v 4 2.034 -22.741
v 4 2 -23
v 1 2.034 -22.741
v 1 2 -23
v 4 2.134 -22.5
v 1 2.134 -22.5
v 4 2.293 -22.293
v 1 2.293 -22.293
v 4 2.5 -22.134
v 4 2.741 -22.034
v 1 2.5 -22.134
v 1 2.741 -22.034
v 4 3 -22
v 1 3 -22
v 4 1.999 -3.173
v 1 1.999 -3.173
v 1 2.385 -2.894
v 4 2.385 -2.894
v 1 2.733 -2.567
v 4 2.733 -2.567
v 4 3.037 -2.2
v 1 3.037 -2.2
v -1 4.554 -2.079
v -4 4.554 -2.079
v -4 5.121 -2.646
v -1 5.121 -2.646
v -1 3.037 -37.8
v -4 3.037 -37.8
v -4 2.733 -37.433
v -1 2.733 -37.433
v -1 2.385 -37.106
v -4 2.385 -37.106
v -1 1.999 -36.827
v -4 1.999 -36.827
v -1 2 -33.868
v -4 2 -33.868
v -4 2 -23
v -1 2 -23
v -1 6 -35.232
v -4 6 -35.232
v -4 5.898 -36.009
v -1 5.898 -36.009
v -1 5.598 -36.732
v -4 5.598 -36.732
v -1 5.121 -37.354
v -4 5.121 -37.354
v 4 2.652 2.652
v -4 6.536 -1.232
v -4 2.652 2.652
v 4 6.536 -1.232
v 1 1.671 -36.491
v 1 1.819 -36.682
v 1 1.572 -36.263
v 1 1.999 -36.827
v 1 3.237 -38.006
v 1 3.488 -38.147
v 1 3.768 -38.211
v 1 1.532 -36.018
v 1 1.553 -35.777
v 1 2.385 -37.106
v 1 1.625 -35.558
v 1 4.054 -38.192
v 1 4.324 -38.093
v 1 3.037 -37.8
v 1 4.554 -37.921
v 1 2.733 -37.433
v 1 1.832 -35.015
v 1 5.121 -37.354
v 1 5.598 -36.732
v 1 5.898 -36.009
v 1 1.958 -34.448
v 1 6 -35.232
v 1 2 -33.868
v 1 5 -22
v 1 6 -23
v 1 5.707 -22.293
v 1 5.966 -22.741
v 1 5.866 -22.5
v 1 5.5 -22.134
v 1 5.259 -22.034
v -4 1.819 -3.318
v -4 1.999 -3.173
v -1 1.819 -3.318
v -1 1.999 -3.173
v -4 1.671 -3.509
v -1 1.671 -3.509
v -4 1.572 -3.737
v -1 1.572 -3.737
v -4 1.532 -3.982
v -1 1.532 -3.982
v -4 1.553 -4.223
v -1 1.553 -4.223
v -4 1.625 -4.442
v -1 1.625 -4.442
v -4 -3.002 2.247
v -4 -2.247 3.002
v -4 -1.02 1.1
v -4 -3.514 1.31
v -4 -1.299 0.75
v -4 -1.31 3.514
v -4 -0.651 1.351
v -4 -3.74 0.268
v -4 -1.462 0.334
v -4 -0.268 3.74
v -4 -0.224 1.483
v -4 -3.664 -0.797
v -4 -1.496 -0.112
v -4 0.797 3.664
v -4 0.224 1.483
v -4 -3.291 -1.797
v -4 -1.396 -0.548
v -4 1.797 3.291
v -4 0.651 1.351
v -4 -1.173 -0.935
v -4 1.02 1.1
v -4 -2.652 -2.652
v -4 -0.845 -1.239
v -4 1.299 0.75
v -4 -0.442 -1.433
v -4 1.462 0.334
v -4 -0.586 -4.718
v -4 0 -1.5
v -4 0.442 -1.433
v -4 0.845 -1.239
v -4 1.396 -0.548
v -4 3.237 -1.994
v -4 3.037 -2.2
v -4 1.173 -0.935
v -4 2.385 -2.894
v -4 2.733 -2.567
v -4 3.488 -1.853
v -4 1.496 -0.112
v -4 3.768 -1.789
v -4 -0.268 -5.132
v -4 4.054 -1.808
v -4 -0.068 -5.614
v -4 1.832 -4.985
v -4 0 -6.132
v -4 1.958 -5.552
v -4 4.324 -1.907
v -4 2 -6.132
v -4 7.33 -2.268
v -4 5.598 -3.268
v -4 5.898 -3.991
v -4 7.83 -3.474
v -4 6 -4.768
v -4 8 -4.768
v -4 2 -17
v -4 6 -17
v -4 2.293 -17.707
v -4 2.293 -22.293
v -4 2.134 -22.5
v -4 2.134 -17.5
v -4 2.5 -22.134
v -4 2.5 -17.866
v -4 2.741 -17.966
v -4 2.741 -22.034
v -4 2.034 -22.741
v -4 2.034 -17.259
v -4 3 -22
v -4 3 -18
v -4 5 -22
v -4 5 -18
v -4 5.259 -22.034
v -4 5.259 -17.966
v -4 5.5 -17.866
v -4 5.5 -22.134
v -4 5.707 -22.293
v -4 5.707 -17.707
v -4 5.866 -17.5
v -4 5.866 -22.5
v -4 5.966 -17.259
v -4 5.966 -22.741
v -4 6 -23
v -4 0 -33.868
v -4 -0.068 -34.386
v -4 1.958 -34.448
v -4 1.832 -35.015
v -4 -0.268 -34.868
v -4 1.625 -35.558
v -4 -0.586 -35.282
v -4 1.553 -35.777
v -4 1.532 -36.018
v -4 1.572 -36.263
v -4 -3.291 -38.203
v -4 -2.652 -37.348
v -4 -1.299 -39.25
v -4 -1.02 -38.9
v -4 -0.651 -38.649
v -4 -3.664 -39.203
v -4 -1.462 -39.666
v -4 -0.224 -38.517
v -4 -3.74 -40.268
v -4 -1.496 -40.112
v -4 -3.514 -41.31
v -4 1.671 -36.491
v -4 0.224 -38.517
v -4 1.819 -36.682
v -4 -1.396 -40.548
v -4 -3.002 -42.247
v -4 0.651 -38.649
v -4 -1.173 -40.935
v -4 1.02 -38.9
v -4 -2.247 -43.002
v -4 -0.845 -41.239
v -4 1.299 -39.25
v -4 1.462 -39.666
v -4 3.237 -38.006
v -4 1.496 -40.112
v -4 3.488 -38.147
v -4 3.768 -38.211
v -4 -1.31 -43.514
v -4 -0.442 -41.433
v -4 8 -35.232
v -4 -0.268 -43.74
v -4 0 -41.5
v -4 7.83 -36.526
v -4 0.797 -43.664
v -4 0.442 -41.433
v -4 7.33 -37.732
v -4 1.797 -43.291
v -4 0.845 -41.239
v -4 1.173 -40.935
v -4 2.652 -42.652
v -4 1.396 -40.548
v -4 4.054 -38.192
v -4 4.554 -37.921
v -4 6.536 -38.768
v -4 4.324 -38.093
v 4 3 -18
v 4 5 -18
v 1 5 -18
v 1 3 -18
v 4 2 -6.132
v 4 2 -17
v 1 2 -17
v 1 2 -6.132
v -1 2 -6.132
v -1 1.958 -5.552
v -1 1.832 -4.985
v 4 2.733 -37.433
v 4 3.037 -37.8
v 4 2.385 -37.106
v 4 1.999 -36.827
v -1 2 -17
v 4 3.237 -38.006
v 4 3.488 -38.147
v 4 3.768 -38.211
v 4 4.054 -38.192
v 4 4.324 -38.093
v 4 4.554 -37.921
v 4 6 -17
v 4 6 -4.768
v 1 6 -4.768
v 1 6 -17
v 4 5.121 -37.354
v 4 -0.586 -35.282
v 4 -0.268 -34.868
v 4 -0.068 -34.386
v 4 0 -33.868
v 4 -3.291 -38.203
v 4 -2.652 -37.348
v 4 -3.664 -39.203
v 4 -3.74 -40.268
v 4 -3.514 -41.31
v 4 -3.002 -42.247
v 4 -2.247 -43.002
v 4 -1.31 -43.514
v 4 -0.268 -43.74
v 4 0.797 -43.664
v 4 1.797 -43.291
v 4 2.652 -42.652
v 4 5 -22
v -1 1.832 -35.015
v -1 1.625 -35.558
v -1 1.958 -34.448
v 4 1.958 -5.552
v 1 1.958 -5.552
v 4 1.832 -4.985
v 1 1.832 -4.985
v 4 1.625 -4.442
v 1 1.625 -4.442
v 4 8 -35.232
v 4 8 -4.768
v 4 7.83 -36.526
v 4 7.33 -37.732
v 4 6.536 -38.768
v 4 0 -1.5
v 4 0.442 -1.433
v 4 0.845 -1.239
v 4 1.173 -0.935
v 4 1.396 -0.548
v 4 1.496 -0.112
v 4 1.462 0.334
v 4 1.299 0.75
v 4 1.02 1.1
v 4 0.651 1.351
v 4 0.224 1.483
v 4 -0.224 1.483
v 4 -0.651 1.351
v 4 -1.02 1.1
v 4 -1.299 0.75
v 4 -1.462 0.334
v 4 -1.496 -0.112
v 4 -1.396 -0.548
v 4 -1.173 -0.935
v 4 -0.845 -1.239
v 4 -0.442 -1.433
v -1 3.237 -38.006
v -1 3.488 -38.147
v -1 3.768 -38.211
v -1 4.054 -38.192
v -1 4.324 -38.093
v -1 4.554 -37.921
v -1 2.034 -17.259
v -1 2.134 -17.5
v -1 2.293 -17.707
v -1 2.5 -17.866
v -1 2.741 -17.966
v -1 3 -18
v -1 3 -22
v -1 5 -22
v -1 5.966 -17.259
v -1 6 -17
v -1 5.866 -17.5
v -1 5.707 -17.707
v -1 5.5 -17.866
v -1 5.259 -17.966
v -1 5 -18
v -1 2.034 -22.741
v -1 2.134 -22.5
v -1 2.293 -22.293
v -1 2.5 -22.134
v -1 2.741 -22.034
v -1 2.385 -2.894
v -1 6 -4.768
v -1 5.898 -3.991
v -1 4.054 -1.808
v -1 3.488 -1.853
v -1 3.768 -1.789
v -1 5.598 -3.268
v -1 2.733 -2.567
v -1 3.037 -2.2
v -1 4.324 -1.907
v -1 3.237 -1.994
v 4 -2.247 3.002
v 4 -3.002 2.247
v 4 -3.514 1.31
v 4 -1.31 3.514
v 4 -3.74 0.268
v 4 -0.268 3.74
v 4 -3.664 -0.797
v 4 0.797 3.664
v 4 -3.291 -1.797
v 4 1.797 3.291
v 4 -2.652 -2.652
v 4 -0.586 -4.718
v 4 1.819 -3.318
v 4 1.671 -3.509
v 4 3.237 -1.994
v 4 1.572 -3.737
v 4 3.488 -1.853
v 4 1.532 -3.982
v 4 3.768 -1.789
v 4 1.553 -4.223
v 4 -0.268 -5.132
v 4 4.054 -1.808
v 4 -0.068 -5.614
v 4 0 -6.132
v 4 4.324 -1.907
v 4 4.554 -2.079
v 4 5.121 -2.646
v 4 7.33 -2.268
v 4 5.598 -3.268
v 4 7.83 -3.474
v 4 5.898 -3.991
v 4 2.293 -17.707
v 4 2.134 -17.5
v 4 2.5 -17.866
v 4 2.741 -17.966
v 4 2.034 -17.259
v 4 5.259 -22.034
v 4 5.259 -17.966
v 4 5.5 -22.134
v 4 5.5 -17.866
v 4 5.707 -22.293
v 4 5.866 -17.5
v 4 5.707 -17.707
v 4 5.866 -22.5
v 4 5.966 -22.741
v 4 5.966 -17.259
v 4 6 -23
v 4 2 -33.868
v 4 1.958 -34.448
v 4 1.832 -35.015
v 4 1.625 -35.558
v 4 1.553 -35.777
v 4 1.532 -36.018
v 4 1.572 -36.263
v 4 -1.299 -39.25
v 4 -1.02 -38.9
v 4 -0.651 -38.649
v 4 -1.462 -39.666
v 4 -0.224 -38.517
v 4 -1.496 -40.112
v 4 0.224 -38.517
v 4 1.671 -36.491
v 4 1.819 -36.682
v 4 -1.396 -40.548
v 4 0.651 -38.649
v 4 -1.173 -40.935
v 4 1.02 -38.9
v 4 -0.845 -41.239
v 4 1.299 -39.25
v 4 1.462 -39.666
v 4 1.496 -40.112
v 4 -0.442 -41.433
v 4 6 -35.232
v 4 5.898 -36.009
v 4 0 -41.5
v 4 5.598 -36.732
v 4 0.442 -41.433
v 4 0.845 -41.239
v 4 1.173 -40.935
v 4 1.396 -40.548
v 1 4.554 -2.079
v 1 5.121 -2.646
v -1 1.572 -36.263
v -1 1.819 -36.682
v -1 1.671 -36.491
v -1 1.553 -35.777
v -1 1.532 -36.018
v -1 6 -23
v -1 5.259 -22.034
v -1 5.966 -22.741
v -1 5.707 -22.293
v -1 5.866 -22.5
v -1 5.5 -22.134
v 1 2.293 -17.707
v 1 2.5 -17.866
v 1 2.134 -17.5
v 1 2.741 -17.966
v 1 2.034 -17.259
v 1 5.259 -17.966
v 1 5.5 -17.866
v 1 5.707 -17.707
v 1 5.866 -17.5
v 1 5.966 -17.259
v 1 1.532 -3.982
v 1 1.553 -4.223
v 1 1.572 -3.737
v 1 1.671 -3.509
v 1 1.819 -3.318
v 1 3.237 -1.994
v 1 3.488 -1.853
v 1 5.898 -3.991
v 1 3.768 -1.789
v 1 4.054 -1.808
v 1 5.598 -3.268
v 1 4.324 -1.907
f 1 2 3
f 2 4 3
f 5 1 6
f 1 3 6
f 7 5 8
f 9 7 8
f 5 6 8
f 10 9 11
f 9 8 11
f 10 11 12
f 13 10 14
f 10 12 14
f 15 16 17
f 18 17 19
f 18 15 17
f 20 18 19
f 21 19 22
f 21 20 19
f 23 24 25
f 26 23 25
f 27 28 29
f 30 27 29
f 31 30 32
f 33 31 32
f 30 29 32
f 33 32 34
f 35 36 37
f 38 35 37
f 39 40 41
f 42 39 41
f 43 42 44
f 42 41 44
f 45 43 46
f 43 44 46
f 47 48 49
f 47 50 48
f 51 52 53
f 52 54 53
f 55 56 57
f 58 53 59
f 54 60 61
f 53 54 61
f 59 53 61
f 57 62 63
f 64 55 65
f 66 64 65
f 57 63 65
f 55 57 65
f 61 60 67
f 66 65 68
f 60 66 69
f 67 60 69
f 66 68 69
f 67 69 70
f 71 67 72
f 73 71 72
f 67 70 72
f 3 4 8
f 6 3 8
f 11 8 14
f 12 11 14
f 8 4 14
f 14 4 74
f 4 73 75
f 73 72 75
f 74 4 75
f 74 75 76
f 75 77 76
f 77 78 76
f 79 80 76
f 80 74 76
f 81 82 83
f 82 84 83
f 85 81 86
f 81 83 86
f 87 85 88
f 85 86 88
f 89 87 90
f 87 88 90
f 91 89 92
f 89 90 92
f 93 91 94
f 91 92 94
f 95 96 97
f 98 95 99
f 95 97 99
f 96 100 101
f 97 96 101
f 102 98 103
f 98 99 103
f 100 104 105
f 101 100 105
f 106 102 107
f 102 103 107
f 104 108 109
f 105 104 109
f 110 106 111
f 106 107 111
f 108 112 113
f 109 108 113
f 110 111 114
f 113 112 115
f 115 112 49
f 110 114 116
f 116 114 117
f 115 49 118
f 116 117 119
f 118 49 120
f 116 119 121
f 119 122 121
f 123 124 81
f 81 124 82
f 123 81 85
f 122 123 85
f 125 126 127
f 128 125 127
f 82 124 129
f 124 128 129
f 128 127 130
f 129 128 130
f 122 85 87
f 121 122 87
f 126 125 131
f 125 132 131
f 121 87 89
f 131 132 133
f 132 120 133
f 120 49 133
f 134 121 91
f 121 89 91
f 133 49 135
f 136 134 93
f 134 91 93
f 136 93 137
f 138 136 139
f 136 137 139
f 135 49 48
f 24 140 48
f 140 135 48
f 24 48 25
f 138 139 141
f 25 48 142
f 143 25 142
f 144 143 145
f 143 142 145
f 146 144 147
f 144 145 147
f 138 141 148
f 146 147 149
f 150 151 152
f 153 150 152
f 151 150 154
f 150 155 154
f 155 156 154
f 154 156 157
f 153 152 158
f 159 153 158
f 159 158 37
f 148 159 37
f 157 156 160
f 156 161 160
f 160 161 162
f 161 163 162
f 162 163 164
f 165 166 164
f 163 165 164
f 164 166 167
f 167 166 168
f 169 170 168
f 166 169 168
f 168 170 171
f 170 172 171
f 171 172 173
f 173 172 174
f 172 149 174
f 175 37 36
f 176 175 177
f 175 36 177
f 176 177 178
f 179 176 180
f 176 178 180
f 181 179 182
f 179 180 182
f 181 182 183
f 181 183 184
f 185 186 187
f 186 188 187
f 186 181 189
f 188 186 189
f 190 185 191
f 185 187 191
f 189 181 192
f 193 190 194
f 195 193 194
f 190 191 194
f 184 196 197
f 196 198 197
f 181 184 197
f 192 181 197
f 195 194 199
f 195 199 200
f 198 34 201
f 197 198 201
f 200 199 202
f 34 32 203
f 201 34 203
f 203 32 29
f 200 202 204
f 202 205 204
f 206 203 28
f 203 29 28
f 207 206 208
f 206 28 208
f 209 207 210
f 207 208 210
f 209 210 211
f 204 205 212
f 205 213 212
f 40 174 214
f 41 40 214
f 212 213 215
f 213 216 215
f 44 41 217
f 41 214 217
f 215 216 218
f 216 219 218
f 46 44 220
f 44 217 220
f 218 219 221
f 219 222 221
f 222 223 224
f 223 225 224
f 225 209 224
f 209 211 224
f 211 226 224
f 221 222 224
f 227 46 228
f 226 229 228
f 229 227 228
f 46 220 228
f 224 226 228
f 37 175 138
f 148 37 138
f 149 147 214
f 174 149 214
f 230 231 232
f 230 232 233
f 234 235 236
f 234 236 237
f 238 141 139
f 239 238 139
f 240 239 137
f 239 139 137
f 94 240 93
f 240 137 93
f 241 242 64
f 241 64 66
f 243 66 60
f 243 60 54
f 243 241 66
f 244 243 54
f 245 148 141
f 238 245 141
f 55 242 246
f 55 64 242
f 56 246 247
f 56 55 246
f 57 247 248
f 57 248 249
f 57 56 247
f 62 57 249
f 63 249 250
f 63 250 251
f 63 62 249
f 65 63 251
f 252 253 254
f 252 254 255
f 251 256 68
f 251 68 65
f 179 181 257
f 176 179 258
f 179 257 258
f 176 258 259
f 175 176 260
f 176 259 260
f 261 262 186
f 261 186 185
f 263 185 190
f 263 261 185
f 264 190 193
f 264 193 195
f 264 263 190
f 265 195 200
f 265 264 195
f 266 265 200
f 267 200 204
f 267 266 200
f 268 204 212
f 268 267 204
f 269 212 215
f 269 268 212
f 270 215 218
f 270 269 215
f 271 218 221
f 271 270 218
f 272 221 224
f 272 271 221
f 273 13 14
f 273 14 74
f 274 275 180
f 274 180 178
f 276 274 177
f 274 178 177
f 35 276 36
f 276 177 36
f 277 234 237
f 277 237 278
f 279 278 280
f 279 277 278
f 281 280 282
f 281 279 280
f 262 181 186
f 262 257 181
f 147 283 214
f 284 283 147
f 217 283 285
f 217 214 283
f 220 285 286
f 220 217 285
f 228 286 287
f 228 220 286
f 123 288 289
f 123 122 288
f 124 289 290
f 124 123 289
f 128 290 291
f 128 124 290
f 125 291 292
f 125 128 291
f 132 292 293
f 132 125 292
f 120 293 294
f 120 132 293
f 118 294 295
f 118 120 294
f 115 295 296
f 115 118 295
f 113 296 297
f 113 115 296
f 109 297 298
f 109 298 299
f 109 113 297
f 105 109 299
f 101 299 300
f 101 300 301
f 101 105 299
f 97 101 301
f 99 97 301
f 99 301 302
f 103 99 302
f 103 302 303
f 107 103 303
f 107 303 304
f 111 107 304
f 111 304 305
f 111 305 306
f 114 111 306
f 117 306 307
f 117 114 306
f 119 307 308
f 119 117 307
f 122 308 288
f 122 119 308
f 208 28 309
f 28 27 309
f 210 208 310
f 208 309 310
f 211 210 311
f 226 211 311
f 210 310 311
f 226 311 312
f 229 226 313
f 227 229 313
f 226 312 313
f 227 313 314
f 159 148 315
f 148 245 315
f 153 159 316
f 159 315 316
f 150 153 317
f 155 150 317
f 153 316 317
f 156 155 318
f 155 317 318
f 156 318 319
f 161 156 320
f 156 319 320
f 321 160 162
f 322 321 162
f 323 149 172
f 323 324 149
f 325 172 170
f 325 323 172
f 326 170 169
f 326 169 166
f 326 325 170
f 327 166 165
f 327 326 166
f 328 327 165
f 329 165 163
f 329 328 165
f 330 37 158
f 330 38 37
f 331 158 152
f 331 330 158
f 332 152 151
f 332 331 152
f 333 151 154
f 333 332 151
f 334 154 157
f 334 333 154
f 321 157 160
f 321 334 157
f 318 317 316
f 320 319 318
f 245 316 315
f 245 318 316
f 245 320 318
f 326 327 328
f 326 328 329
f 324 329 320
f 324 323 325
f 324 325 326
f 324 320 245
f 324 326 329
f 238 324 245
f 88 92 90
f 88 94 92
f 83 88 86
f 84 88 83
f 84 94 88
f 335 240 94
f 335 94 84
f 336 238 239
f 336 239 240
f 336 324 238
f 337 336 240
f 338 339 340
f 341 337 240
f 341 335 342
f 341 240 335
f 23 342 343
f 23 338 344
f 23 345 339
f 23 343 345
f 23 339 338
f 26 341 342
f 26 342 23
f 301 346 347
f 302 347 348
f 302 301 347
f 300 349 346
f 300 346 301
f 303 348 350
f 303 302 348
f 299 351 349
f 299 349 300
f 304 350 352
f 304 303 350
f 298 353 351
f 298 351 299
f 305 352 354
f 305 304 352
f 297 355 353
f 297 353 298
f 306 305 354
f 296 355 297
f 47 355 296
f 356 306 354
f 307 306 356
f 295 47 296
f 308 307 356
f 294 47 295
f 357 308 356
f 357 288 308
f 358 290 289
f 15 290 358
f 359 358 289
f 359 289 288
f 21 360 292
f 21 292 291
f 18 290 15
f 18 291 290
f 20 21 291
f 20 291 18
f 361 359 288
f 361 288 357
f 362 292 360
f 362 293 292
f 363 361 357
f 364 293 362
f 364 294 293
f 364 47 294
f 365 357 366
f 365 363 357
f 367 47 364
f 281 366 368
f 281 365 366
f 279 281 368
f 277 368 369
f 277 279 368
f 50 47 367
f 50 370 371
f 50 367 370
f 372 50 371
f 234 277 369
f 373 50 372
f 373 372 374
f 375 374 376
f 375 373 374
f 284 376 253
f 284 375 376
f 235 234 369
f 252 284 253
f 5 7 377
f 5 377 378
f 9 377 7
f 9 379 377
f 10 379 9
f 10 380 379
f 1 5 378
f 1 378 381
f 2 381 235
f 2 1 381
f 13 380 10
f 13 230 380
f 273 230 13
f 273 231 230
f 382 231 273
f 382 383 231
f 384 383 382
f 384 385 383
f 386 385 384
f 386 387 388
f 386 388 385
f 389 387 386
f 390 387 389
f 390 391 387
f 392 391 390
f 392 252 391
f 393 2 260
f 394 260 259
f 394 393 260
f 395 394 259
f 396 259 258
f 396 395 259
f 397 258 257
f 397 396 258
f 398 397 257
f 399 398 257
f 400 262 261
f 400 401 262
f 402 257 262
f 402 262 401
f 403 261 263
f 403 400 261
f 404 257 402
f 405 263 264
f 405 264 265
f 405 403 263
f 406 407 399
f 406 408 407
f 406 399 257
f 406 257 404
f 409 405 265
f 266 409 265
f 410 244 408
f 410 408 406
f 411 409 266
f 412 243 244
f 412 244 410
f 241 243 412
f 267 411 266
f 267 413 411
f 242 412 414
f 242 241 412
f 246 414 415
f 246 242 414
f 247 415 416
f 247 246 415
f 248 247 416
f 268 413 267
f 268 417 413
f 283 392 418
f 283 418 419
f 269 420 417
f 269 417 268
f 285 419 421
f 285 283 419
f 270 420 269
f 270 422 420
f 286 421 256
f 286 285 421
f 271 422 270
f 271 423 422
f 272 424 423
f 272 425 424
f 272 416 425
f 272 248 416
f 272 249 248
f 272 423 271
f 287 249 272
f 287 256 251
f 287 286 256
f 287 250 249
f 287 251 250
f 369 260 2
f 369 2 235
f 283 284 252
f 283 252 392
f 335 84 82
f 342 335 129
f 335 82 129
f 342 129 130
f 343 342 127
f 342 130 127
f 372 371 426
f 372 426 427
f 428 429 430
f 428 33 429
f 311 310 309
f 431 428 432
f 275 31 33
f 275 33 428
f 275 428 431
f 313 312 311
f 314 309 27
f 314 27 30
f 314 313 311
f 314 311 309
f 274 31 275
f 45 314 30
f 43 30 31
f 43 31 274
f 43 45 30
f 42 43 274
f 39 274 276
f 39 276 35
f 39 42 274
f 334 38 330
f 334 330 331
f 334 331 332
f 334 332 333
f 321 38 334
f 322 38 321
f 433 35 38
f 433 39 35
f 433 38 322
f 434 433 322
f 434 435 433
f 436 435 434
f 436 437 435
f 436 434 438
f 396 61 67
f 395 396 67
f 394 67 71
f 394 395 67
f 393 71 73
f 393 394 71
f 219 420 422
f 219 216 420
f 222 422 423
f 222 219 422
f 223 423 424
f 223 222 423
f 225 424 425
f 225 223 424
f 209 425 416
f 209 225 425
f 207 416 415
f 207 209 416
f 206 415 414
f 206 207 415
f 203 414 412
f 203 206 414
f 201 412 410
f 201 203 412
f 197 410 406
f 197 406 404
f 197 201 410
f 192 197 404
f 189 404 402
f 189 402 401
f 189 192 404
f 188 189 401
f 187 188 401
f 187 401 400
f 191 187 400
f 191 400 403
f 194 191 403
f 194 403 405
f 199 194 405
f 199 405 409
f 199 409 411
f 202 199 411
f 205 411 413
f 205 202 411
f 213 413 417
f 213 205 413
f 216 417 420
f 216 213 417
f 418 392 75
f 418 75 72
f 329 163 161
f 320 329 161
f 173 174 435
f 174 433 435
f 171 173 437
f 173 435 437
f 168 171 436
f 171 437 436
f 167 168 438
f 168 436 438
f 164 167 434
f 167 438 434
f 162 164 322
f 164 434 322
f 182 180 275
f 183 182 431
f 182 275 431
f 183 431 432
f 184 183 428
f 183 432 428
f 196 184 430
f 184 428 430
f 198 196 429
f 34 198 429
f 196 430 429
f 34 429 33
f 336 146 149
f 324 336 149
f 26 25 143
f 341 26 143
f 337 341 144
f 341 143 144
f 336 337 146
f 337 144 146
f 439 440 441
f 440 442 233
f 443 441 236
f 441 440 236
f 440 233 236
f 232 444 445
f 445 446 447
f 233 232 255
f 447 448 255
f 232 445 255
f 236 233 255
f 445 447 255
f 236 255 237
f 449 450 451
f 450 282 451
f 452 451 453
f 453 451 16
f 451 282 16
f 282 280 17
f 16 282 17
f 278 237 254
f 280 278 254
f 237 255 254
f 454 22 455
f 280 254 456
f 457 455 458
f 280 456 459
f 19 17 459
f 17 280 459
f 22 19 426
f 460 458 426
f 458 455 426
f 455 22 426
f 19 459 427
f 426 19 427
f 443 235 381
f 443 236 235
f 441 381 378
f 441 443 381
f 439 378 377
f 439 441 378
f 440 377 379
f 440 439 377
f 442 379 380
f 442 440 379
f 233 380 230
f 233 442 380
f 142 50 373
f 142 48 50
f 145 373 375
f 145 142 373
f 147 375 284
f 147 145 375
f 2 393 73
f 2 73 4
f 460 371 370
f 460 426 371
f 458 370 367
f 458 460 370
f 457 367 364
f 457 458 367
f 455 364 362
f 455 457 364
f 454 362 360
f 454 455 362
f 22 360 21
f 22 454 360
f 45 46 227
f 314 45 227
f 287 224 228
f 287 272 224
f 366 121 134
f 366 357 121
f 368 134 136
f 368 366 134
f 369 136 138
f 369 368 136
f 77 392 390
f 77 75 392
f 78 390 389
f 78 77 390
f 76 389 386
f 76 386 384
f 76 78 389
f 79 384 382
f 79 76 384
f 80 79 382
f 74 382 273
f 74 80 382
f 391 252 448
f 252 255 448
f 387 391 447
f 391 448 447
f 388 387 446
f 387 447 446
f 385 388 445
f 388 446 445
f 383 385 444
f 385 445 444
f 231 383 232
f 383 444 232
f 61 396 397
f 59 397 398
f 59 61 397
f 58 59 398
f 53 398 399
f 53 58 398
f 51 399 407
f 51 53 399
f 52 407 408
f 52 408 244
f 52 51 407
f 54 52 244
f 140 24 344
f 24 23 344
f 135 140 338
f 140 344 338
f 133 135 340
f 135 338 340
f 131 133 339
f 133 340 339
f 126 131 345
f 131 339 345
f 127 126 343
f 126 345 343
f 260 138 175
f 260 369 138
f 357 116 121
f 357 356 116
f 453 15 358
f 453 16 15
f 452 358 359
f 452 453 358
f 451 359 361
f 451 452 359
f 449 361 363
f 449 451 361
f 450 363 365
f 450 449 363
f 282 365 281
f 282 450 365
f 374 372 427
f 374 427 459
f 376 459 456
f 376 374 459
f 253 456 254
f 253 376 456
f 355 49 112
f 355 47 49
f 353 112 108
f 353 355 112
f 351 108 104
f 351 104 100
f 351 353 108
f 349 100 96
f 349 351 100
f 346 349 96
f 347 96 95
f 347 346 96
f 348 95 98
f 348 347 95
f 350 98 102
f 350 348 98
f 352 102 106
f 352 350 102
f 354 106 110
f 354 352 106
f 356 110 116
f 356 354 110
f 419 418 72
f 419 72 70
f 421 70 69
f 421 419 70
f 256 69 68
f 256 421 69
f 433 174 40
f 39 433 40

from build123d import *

# Parameters (mm, degrees)
SKETCH_1_R          = 1.5
EXTRUDE_1_DEPTH     = 4
FILLET_1_R          = 2
FILLET_2_R          = 5
CUT_EXTRUDE_1_DEPTH = 3
FILLET_3_R          = 1


with BuildPart() as part:
    # 草图1 → 凸台-拉伸1 (new, symmetric)
    with BuildSketch(Plane(origin=(0, 0, 0), x_dir=(0, 0, -1), z_dir=(1, 0, 0))):
        with BuildLine():
            Line((2.651650429, -2.651650429), (5.303300859, 0))
            Line((5.303300859, 0), (34.696699141, 0))
            Line((34.696699141, 0), (37.348349571, -2.651650429))
            ThreePointArc((37.348349571, -2.651650429), (42.651650429, -2.651650429), (42.651650429, 2.651650429))
            Line((42.651650429, 2.651650429), (37.303300859, 8))
            Line((37.303300859, 8), (2.696699141, 8))
            Line((2.696699141, 8), (-2.651650429, 2.651650429))
            ThreePointArc((-2.651650429, 2.651650429), (-2.651650429, -2.651650429), (2.651650429, -2.651650429))
        make_face()
        Circle(SKETCH_1_R, mode=Mode.SUBTRACT)
        with Locations((40, 0)):
            Circle(SKETCH_1_R, mode=Mode.SUBTRACT)
    extrude(amount=EXTRUDE_1_DEPTH, both=True)

    # 圆角1
    fillet_1_edges = [part.edges().sort_by_distance(p)[0] for p in [
        (0, 0, -34.696699141),
        (0, 0, -5.303300859),
    ]]
    fillet(fillet_1_edges, radius=FILLET_1_R)

    # 圆角2
    fillet_2_edges = [part.edges().sort_by_distance(p)[0] for p in [
        (0, 8, -2.696699141),
        (0, 8, -37.303300859),
    ]]
    fillet(fillet_2_edges, radius=FILLET_2_R)

    # 草图2 → 切除-拉伸1 (cut)
    with BuildSketch(Plane(origin=(4, 0, 0), x_dir=(0, 0, -1), z_dir=(1, 0, 0))):
        with BuildLine():
            Line((18, 6), (18, 2))
            Line((18, 2), (6.131727984, 2))
            ThreePointArc((6.131727984, 2), (4.780909332, 1.765008496), (3.588806135, 1.087644486))
            ThreePointArc((3.588806135, 1.087644486), (2.659081759, 2.644198215), (1.107771013, 3.582644747))
            Line((1.107771013, 3.582644747), (2.646446609, 5.121320344))
            ThreePointArc((2.646446609, 5.121320344), (3.619716656, 5.771638598), (4.767766953, 6))
            Line((4.767766953, 6), (18, 6))
        make_face()
        with BuildLine():
            Line((22, 2), (22, 6))
            Line((22, 6), (35.232233047, 6))
            ThreePointArc((35.232233047, 6), (36.380283344, 5.771638598), (37.353553391, 5.121320344))
            Line((37.353553391, 5.121320344), (38.892228987, 3.582644747))
            ThreePointArc((38.892228987, 3.582644747), (37.340918241, 2.644198215), (36.411193865, 1.087644486))
            ThreePointArc((36.411193865, 1.087644486), (35.219090668, 1.765008496), (33.868272016, 2))
            Line((33.868272016, 2), (22, 2))
        make_face()
    cut_extrude_1 = extrude(amount=-CUT_EXTRUDE_1_DEPTH, mode=Mode.SUBTRACT)

    # 镜向1: 切除-拉伸1 across plane
    add(cut_extrude_1.mirror(Plane(origin=(0, 0, 0), x_dir=(0, 0, 1), z_dir=(1, 0, 0))), mode=Mode.SUBTRACT)

    # 圆角3
    fillet_3_edges = [part.edges().sort_by_distance(p)[0] for p in [
        (-2.5, 1.087644486, -36.411193865),
        (-2.5, 3.582644747, -38.892228987),
        (-2.5, 6, -22),
        (-2.5, 2, -22),
        (-2.5, 6, -18),
        (-2.5, 3.582644747, -1.107771013),
        (-2.5, 1.087644486, -3.588806135),
        (-2.5, 2, -18),
        (2.5, 1.087644486, -36.411193865),
        (2.5, 2, -22),
        (2.5, 6, -22),
        (2.5, 3.582644747, -38.892228987),
        (2.5, 6, -18),
        (2.5, 2, -18),
        (2.5, 1.087644486, -3.588806135),
        (2.5, 3.582644747, -1.107771013),
    ]]
    fillet(fillet_3_edges, radius=FILLET_3_R)


solid = part.part
